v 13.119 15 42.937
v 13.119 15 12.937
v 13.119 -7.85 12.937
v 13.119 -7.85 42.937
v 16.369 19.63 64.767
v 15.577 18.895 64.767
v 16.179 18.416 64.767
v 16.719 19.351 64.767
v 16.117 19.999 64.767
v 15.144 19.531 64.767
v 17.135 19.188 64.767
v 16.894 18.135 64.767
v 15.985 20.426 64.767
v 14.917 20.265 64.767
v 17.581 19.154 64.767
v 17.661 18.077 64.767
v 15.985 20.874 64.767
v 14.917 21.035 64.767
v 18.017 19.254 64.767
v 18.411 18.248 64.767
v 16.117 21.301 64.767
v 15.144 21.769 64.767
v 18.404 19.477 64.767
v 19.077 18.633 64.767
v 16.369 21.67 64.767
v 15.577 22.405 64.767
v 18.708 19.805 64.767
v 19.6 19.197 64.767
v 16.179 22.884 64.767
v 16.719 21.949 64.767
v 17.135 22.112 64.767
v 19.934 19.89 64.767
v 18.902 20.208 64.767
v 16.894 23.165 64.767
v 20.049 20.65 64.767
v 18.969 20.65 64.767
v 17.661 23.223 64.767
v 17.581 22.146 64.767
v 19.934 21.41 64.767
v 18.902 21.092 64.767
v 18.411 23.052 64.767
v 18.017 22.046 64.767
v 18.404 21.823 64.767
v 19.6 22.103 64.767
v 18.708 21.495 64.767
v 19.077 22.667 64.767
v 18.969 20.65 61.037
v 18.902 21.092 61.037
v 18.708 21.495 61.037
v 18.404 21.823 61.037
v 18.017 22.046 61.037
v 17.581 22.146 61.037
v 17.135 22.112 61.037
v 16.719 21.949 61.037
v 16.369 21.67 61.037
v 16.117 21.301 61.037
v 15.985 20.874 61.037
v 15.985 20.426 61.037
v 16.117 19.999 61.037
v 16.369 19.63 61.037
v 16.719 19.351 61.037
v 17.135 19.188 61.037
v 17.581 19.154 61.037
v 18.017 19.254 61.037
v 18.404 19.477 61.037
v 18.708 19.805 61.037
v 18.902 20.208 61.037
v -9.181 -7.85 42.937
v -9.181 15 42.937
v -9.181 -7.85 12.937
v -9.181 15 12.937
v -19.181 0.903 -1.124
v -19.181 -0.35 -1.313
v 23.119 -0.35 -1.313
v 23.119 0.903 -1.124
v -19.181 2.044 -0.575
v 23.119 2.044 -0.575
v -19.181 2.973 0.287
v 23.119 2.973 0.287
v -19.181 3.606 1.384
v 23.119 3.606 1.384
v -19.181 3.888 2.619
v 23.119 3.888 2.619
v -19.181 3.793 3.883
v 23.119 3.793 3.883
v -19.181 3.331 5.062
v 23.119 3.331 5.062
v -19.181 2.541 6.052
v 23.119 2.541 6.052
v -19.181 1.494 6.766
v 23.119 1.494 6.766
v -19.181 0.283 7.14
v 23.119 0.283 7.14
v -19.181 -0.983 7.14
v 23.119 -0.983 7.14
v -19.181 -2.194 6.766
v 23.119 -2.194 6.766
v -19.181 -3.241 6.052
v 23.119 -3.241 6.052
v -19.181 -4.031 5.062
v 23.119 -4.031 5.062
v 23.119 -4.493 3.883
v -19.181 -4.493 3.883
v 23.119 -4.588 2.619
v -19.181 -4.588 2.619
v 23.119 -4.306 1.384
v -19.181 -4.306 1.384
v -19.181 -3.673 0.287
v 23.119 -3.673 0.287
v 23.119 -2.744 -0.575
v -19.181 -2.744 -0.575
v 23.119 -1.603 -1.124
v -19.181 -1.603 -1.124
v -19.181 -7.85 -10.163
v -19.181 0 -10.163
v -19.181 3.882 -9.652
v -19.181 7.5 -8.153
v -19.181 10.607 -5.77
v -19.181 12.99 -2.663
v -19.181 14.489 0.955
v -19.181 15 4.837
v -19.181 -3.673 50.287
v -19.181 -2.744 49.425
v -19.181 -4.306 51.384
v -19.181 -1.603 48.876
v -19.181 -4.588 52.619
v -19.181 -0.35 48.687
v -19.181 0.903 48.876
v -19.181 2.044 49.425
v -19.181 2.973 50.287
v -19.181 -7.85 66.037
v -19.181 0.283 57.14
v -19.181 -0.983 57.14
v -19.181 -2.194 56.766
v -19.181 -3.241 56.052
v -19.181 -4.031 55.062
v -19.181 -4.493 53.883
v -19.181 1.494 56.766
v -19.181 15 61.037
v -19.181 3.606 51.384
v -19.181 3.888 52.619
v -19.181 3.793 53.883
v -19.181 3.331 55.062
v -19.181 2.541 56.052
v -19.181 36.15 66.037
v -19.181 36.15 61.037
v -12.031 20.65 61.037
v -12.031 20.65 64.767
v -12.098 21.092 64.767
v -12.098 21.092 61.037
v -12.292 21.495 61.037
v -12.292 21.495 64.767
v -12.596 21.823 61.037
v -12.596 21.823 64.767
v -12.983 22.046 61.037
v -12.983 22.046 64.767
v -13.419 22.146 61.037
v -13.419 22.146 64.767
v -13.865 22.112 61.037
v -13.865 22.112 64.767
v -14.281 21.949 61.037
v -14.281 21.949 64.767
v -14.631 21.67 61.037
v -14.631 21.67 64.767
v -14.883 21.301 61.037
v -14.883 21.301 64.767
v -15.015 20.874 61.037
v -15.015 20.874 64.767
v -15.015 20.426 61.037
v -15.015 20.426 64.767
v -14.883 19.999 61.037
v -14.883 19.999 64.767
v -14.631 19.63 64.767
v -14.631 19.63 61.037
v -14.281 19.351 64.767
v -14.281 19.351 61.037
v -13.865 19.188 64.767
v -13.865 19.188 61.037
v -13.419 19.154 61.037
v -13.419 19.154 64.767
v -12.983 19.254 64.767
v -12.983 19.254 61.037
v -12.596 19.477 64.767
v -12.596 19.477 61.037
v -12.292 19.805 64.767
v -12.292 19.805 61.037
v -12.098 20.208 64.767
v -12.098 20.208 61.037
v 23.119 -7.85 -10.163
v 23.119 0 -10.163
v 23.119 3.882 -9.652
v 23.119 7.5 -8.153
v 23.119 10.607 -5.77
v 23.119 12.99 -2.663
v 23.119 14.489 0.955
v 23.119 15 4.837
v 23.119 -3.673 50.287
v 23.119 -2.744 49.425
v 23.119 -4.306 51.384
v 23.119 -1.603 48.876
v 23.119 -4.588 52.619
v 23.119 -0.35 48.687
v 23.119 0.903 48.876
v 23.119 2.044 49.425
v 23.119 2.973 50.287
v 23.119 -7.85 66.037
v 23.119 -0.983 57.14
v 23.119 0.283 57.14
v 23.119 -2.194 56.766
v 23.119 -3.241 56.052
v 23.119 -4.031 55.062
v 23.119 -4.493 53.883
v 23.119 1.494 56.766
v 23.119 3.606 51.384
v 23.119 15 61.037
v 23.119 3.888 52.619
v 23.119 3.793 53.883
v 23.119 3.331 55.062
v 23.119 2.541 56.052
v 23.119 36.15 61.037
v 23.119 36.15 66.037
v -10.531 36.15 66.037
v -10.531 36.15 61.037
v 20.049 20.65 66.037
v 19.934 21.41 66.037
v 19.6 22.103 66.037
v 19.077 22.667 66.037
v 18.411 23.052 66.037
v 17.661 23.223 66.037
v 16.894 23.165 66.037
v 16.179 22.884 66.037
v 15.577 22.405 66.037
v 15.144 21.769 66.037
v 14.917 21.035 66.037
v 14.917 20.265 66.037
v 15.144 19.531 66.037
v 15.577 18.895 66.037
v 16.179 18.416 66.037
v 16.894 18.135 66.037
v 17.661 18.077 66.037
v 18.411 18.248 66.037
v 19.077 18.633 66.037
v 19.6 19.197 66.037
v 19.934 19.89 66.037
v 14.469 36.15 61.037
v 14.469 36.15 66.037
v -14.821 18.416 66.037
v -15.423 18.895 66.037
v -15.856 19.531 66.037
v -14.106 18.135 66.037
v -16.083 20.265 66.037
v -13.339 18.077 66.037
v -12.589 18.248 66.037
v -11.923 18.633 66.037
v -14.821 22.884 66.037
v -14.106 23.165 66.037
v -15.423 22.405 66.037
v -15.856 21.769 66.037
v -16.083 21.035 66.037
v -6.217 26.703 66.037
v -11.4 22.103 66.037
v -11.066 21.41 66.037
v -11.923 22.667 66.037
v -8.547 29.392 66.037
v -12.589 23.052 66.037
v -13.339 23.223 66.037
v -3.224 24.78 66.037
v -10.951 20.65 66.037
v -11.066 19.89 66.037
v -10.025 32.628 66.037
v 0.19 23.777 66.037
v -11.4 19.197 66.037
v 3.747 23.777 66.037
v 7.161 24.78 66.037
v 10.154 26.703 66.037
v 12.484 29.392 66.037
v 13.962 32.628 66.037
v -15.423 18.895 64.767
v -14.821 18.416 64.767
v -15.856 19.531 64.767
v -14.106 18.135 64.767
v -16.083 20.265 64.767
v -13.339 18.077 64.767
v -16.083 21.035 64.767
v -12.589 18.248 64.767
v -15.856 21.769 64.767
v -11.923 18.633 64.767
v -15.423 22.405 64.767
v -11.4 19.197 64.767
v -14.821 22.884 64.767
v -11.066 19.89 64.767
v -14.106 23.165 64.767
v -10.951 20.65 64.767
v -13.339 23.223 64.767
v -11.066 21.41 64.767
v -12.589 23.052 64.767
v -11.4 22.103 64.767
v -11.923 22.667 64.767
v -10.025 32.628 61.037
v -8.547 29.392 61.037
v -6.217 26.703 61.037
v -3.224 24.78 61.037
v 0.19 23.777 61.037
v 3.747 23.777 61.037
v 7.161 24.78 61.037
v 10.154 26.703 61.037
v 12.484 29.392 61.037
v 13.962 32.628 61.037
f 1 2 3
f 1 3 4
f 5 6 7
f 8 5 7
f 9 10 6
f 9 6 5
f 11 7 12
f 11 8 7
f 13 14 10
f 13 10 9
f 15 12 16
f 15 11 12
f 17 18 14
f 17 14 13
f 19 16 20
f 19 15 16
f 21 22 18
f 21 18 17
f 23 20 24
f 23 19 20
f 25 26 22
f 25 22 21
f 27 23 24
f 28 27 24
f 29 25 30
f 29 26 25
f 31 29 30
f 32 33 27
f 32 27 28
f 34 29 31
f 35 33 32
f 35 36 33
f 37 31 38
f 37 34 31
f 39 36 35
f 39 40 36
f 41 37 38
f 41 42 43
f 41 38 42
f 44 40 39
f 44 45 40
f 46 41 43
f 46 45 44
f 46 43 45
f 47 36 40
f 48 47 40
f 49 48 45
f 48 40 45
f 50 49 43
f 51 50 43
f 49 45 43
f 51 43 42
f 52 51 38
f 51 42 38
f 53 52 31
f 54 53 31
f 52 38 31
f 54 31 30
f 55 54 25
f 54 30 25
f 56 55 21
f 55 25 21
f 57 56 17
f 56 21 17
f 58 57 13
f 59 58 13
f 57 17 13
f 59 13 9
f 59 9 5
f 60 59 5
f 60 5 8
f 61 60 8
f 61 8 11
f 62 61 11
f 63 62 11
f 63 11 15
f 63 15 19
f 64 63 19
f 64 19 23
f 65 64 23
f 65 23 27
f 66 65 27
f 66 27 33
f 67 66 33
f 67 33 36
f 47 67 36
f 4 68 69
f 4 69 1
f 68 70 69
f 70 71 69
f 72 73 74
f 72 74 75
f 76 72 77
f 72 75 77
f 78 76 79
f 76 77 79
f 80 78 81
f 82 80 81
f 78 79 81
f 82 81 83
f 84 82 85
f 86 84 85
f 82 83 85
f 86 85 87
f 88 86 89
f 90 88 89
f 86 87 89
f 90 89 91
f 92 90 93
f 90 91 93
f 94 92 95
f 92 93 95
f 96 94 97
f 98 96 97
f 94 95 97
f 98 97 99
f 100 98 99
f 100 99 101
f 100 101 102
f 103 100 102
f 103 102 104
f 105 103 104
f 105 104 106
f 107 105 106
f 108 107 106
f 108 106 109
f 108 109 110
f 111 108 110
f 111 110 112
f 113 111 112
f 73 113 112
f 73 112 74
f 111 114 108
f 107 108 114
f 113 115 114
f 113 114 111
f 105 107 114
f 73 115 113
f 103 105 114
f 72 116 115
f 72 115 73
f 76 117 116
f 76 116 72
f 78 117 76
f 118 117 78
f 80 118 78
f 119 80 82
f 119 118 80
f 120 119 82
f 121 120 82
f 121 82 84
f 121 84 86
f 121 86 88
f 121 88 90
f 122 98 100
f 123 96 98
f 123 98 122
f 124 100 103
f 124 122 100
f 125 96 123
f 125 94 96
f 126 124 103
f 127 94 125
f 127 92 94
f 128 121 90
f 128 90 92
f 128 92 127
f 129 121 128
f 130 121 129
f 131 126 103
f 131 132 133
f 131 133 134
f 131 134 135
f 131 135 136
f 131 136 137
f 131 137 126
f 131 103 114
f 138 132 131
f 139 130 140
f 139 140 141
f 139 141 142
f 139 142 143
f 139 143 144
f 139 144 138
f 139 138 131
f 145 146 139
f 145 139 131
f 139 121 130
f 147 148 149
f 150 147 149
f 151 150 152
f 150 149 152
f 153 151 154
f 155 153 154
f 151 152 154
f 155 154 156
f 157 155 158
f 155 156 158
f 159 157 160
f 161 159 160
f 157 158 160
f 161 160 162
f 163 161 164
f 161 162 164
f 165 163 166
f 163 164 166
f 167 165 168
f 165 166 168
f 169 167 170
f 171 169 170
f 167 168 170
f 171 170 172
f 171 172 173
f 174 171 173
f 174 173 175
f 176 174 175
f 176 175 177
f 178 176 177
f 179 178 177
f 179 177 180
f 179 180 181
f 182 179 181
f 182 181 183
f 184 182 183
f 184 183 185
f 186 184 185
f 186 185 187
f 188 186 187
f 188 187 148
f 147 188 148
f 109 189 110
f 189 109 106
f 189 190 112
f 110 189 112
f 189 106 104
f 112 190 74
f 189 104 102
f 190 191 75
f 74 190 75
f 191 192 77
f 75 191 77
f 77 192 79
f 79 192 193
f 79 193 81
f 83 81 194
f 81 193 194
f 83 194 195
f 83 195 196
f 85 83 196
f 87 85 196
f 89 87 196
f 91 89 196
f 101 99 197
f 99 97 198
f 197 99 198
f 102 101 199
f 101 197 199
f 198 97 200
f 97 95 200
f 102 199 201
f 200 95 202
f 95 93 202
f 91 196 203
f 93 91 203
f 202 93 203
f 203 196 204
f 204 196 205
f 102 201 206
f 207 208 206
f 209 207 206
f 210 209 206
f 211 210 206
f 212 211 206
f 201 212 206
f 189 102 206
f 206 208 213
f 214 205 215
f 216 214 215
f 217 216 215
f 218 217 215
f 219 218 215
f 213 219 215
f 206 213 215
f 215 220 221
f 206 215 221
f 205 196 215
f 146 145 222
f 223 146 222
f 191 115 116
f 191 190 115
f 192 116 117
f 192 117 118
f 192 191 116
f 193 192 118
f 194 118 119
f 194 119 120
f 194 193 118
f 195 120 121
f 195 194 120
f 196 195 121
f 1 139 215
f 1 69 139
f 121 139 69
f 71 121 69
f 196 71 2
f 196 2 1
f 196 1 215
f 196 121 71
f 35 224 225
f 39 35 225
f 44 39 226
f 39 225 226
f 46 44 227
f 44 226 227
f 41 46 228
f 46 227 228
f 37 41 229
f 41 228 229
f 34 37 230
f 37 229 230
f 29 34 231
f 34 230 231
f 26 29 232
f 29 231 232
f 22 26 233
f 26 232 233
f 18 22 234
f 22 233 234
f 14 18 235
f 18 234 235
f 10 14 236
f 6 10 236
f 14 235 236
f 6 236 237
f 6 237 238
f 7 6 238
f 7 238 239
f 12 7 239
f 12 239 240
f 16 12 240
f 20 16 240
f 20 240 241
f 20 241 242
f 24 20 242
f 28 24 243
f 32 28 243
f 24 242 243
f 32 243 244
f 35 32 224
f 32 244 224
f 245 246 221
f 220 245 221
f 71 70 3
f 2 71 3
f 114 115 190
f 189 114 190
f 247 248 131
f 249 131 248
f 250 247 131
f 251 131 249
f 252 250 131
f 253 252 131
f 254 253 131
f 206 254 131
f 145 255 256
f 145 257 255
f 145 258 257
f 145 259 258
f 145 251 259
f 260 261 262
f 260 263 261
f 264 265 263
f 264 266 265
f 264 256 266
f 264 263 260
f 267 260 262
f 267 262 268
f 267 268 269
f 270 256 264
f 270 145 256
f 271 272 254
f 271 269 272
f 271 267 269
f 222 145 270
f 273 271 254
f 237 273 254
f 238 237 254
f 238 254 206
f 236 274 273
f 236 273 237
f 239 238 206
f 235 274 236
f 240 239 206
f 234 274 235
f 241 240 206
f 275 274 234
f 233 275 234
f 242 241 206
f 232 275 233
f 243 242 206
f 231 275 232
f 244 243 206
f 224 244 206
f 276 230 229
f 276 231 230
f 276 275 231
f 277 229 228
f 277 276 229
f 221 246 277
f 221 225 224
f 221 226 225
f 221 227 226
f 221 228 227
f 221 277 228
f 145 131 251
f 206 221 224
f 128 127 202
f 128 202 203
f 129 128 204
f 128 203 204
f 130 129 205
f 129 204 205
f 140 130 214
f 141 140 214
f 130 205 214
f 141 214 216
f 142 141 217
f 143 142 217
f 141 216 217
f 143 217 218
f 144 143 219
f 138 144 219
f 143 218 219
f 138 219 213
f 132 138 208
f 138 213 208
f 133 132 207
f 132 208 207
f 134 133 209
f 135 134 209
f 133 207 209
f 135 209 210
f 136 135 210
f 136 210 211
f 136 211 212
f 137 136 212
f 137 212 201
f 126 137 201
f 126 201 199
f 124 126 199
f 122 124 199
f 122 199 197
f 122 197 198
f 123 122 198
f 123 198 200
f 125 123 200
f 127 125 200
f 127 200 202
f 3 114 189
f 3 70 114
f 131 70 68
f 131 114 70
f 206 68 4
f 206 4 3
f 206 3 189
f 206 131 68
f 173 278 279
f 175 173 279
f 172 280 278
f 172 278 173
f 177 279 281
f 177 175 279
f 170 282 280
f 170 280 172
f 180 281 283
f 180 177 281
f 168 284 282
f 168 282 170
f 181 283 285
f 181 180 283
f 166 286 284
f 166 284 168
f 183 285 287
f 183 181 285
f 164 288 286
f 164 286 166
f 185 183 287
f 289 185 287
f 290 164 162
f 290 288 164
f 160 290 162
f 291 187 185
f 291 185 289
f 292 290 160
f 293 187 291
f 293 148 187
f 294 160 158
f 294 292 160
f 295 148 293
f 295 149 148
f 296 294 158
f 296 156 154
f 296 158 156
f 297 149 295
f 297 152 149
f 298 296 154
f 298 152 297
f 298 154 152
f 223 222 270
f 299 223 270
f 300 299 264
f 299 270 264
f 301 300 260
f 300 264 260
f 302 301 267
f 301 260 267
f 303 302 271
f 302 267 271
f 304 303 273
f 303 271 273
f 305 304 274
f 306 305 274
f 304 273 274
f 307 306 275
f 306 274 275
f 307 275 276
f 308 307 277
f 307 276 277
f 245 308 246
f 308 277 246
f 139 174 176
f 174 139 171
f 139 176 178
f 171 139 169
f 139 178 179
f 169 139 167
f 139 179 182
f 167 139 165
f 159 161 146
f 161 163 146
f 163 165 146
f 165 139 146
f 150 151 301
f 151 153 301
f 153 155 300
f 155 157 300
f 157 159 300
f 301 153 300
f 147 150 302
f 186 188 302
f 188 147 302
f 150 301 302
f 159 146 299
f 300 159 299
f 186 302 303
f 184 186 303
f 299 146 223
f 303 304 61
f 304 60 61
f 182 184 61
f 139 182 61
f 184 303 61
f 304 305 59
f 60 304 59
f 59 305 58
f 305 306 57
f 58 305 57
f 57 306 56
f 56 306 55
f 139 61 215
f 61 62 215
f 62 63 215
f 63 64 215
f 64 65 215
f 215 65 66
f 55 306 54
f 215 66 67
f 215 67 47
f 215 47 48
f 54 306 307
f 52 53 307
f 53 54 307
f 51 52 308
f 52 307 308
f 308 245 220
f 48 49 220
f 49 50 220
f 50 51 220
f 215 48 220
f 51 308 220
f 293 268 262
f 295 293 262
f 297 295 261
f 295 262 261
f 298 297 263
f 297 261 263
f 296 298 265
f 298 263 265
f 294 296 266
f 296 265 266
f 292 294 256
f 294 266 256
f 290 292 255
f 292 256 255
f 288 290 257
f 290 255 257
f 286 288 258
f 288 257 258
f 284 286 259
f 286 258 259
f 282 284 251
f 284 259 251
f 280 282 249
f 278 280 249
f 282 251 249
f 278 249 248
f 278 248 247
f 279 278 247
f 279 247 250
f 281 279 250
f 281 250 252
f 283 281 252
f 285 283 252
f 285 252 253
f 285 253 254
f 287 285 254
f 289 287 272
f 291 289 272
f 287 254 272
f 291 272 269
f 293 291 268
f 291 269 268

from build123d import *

# Parameters (mm, degrees)
SKETCH2_W                        = 42.3
SKETCH2_H                        = 76.2
BOSS_EXTRUDE1_DEPTH              = 15
SKETCH5_W                        = 42.3
SKETCH5_H                        = 42.3
MOUNTING_DEPTH                   = 5
SKETCH6_R                        = 12.5
SKETCH6_W                        = 42.3
SKETCH6_H                        = 21.15
PULLY_HOLE_DEPTH                 = 77.2
SKETCH8_R                        = 1.5
CUT_EXTRUDE_M3_DEPTH             = 77.2
SKETCH9_R                        = 2.58
SCREW_TOPS_DEPTH                 = 1.27
SKETCH11_W                       = 22.3
SKETCH11_H                       = 30
CUT_EXTRUDE1_DEPTH               = 37.15
SKETCH12_W                       = 42.3
SKETCH12_H                       = 76.2
SKETCH12_W_2                     = 22.3
SKETCH12_H_2                     = 30
F_7_85_CORRECTION_TO_MATCH_DEPTH = 7.85
SKETCH13_R                       = 4.25
CUT_EXTRUDE2_DEPTH               = 43.3
FILLET1_R                        = 15


with BuildPart() as part:
    # Sketch2 → Boss-Extrude1 (new body)
    with BuildSketch(Plane(origin=(0, 0, 0), x_dir=(1, 0, 0), z_dir=(0, 1, 0))):
        with Locations((1.968506494, -27.937012987)):
            Rectangle(SKETCH2_W, SKETCH2_H)
    extrude(amount=BOSS_EXTRUDE1_DEPTH)

    # Sketch5 → Mounting (add)
    with BuildSketch(Plane.XY.offset(66.037012987)):
        with Locations((1.968506494, 36.15)):
            Rectangle(SKETCH5_W, SKETCH5_H)
    extrude(amount=-MOUNTING_DEPTH)

    # Sketch6 → Pully Hole (cut, through all)
    with BuildSketch(Plane.XY.offset(66.037012987)):
        with Locations((1.968506494, 36.15)):
            Circle(SKETCH6_R)
        with Locations((1.968506494, 46.725)):
            Rectangle(SKETCH6_W, SKETCH6_H)
    extrude(amount=-PULLY_HOLE_DEPTH, mode=Mode.SUBTRACT)

    # Sketch8 → Cut-Extrude M3 (cut, through all)
    with BuildSketch(Plane.XY.offset(66.037012987)):
        with Locations((-13.531493506, 20.65)):
            Circle(SKETCH8_R)
        with Locations((17.468506494, 20.65)):
            Circle(SKETCH8_R)
    extrude(amount=-CUT_EXTRUDE_M3_DEPTH, mode=Mode.SUBTRACT)

    # Sketch9 → Screw Tops (cut)
    with BuildSketch(Plane.XY.offset(66.037012987)):
        with Locations((-13.531493506, 20.65)):
            Circle(SKETCH9_R)
        with Locations((17.468506494, 20.65)):
            Circle(SKETCH9_R)
    extrude(amount=-SCREW_TOPS_DEPTH, mode=Mode.SUBTRACT)

    # Sketch11 → Cut-Extrude1 (cut, through all)
    with BuildSketch(Plane.XZ):
        with Locations((1.968506494, 27.937012987)):
            Rectangle(SKETCH11_W, SKETCH11_H)
    extrude(amount=-CUT_EXTRUDE1_DEPTH, mode=Mode.SUBTRACT)

    # Sketch12 → 7.85 correction to match (add)
    with BuildSketch(Plane.XZ):
        with Locations((1.968506494, 27.937012987)):
            Rectangle(SKETCH12_W, SKETCH12_H)
        with Locations((1.968506494, 27.937012987)):
            Rectangle(SKETCH12_W_2, SKETCH12_H_2, mode=Mode.SUBTRACT)
    extrude(amount=F_7_85_CORRECTION_TO_MATCH_DEPTH)

    # Sketch13 → Cut-Extrude2 (cut, through all)
    with BuildSketch(Plane(origin=(23.118506494, 0, 0), x_dir=(0, 0, -1), z_dir=(1, 0, 0))):
        with Locations((-52.937012987, -0.35)):
            Circle(SKETCH13_R)
        with Locations((-2.937012987, -0.35)):
            Circle(SKETCH13_R)
    extrude(amount=-CUT_EXTRUDE2_DEPTH, mode=Mode.SUBTRACT)

    # Fillet1
    fillet1_edges = [part.edges().sort_by_distance(p)[0] for p in [
        (1.968506494, 15, -10.162987013),
    ]]
    fillet(fillet1_edges, radius=FILLET1_R)


solid = part.part
